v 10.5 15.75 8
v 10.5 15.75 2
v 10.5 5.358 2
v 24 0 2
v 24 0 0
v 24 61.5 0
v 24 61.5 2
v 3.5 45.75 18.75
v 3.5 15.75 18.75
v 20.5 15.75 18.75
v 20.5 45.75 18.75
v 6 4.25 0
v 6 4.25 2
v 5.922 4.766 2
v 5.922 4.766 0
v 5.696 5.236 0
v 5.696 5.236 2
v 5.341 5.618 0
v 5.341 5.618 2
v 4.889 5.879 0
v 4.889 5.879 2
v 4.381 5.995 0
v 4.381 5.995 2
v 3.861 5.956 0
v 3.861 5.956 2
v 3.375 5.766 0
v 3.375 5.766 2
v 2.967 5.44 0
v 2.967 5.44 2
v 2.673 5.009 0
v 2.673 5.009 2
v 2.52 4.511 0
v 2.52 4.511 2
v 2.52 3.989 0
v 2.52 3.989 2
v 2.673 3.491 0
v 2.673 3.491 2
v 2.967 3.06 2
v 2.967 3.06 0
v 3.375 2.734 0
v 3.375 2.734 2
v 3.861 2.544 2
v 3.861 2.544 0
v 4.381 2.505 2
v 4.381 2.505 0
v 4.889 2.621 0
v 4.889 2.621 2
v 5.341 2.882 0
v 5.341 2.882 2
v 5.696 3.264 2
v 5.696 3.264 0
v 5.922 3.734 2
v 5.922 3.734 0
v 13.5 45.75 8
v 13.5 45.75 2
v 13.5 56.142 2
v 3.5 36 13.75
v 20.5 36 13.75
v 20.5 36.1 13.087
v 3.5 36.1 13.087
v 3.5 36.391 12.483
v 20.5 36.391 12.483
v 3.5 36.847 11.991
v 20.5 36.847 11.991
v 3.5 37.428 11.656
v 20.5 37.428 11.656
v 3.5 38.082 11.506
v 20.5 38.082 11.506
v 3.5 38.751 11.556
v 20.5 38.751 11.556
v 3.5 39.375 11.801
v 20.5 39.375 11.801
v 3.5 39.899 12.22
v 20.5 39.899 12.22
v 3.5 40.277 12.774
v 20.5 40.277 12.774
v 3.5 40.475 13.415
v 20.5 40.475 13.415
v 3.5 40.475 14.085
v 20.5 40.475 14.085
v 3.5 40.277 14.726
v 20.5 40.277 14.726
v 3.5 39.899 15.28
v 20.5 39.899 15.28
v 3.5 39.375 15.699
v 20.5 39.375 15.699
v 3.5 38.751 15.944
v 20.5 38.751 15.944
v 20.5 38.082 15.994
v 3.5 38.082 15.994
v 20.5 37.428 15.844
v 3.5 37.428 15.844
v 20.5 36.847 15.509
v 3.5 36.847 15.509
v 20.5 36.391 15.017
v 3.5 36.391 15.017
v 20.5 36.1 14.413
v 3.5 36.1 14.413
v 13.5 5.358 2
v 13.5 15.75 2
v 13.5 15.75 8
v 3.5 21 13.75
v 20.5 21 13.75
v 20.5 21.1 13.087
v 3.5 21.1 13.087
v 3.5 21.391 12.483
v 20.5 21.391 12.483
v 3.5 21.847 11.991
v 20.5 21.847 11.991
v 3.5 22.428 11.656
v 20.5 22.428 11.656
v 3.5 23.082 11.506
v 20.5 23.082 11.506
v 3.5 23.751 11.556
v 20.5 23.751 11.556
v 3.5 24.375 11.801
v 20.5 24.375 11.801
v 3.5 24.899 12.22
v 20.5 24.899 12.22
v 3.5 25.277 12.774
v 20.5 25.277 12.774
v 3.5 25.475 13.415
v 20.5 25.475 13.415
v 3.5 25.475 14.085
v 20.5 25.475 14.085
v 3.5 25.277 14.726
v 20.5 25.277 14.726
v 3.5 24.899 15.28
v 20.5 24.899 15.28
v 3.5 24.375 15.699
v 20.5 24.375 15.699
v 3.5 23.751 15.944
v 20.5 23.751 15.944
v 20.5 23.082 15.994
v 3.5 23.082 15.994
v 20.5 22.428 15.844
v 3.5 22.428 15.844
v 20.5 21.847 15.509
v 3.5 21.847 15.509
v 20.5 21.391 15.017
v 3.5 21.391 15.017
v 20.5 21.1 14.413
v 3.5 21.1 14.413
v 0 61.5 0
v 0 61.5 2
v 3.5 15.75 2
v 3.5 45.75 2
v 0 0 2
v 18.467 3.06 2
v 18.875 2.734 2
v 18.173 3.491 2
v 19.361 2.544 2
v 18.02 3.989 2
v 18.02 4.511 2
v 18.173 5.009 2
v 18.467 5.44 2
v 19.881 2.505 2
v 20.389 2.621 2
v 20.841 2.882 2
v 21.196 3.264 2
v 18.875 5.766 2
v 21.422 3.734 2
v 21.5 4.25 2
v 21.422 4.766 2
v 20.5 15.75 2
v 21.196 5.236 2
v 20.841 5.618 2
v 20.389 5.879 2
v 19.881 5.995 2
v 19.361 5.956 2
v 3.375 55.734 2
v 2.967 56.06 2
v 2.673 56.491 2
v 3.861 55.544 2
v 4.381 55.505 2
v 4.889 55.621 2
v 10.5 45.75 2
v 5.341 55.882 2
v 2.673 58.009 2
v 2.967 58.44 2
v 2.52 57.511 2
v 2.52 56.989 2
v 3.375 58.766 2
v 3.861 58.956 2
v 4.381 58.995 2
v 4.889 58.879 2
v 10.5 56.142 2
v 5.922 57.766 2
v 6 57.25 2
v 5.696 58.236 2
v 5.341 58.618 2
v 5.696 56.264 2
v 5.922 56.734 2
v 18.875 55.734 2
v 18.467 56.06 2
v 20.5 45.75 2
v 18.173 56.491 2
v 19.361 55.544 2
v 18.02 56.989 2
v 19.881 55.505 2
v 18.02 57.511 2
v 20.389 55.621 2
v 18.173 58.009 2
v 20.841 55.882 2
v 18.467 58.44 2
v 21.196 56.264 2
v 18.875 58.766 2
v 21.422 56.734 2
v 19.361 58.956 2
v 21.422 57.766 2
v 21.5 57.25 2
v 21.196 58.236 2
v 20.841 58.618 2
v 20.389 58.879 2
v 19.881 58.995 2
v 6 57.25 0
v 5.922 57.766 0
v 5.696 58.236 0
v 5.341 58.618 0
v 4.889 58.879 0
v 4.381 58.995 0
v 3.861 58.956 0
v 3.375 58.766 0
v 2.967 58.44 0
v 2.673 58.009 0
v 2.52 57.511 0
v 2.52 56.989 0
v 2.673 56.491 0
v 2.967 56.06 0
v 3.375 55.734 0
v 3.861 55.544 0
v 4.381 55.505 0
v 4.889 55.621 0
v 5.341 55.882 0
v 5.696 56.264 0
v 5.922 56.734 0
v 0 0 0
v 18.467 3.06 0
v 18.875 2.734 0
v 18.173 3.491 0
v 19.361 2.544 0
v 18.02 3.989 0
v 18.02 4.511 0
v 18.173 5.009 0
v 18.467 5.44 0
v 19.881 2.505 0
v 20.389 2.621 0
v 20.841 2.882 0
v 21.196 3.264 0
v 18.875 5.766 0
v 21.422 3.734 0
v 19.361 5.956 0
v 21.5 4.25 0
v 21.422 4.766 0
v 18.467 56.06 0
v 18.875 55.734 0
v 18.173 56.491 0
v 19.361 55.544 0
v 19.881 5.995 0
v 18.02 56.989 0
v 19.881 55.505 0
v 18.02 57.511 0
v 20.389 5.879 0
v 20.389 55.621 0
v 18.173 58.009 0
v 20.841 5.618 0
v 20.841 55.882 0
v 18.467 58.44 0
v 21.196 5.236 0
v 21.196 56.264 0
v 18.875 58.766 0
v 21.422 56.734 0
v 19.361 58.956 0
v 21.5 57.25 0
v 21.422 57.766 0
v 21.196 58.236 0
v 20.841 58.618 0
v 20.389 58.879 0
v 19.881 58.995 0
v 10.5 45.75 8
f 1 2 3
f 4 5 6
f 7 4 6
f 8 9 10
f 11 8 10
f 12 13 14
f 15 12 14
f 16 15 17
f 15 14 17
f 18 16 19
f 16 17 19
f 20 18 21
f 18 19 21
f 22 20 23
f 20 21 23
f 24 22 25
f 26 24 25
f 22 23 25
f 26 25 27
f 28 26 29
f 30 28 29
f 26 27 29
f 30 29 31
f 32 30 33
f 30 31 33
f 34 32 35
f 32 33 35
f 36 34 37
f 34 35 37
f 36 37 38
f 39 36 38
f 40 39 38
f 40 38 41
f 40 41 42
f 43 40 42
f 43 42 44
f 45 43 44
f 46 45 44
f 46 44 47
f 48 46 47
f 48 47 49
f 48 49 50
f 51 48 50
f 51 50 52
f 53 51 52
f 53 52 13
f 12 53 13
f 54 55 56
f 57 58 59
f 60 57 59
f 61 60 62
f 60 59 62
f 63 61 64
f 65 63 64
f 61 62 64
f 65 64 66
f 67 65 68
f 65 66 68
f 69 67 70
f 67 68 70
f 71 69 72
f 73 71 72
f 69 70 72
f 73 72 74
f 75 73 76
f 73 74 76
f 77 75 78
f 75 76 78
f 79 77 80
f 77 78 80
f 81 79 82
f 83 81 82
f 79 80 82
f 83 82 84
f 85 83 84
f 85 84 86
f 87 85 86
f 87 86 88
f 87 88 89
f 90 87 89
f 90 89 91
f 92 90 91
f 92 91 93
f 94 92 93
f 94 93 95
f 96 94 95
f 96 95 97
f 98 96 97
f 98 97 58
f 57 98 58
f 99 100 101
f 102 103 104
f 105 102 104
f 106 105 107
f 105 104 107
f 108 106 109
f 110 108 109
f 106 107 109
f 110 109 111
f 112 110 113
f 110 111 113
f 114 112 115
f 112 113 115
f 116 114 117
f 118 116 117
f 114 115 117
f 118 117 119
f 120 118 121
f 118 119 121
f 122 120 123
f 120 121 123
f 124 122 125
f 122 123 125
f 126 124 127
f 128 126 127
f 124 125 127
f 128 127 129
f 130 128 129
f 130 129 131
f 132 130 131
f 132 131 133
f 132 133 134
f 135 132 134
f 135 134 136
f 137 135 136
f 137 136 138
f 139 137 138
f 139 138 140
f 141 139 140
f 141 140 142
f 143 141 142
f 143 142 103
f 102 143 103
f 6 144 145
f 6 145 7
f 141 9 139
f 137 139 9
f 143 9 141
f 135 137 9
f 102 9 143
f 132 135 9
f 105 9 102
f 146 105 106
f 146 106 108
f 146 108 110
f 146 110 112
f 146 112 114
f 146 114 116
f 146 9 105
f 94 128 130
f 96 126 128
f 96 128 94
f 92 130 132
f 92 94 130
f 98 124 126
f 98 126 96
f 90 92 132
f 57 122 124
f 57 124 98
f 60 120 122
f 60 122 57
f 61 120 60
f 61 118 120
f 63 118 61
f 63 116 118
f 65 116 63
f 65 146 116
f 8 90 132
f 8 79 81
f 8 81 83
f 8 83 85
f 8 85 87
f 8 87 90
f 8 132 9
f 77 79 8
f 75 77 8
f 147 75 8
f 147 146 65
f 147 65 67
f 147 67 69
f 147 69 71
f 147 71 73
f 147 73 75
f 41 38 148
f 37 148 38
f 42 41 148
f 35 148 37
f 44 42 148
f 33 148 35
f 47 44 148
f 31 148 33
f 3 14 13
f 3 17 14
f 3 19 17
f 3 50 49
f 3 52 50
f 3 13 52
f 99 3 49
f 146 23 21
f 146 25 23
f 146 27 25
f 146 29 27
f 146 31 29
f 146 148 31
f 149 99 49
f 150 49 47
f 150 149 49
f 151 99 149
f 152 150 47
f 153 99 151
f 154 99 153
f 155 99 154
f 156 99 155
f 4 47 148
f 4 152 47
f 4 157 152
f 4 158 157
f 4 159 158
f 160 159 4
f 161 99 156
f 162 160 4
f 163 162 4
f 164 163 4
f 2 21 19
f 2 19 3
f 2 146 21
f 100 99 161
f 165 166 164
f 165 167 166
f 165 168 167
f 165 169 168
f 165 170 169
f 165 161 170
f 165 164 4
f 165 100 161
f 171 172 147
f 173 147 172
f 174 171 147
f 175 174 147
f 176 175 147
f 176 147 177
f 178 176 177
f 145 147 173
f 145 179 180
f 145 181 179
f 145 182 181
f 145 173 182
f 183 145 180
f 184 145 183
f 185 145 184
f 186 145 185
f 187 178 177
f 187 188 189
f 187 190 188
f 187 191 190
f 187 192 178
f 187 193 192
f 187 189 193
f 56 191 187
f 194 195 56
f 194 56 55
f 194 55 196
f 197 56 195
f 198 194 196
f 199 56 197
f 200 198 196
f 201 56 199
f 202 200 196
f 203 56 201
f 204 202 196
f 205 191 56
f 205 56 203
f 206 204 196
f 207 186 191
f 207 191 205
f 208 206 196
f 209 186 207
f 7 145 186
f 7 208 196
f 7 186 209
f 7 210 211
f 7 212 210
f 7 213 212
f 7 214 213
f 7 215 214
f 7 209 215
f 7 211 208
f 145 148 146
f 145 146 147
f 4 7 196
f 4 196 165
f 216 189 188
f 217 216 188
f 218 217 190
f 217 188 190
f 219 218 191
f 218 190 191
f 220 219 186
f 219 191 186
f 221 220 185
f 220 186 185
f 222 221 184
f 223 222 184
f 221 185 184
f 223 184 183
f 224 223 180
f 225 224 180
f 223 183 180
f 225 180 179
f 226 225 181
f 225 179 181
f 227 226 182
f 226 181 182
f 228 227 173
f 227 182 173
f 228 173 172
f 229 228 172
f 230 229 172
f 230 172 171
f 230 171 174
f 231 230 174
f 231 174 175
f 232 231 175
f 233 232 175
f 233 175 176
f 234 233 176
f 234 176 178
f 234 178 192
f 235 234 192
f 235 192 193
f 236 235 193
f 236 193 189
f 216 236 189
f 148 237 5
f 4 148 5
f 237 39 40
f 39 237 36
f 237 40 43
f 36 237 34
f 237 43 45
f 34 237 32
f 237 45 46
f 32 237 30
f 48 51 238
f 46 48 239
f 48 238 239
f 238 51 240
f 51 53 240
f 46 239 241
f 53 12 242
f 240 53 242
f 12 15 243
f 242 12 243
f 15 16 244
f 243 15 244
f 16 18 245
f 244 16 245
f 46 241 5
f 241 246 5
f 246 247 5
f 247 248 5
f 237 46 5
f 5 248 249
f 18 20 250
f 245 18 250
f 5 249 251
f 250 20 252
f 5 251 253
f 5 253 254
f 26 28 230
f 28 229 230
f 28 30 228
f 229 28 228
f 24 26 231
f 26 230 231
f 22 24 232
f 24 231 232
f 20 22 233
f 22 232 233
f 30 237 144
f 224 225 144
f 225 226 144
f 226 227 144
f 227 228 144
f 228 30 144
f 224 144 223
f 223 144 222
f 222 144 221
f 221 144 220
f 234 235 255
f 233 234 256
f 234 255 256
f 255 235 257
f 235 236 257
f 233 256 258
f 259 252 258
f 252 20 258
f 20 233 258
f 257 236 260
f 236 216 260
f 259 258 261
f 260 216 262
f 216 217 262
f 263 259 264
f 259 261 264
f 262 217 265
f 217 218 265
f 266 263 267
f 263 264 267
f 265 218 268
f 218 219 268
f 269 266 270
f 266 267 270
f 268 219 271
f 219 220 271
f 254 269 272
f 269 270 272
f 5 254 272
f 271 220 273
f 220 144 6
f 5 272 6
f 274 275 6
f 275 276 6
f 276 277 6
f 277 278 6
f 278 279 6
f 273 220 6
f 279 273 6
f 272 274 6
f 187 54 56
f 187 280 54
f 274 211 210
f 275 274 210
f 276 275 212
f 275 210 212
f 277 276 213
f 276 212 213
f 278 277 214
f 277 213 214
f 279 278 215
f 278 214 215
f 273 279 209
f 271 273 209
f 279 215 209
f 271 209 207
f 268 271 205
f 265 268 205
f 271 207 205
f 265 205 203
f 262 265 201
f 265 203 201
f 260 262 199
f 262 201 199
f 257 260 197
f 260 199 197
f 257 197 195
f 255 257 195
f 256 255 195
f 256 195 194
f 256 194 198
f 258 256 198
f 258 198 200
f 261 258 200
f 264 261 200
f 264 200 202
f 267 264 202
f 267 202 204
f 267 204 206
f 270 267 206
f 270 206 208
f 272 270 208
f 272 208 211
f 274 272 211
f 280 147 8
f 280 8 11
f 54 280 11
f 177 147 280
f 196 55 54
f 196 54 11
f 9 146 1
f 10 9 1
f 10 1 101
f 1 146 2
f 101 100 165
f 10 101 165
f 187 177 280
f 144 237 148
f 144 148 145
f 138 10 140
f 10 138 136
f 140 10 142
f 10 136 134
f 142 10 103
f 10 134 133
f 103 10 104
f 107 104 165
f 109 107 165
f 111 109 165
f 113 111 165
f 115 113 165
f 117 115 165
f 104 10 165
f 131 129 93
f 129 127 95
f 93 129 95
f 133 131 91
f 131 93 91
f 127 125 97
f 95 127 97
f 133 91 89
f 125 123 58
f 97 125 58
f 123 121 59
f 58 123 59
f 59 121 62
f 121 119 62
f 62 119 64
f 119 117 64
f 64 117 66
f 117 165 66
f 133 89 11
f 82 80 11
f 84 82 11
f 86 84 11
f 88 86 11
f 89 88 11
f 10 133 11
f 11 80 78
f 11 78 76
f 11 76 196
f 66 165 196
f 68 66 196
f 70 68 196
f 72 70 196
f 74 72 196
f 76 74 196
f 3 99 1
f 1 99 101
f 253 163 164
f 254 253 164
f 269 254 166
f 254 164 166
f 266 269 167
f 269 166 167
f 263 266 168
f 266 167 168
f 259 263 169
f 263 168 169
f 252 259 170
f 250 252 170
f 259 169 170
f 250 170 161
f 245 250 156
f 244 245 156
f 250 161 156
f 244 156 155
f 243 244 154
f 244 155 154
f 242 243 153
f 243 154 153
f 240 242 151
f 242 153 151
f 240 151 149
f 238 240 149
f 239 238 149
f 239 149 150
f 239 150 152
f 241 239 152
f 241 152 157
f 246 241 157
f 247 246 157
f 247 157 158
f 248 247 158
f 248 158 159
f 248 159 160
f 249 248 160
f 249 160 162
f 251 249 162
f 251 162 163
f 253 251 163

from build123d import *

# Parameters (mm, degrees)
SKETCH_2_W          = 24
SKETCH_2_H          = 61.5
SKETCH_2_R          = 1.75
EXTRUDE_1_DEPTH     = 2
SKETCH_3_W          = 17
SKETCH_3_H          = 30
EXTRUDE_2_DEPTH     = 16.75
SKETCH_4_R          = 2.25
CUT_EXTRUDE_1_DEPTH = 69.628073702
EXTRUDE_3_DEPTH     = 1.5
EXTRUDE_START       = -2
SKETCH_6_R          = 1.75
EXTRUDE_4_DEPTH     = 2
SKETCH_7_R          = 1.75
CUT_EXTRUDE_2_DEPTH = 69.108828356


with BuildPart() as part:
    # 草图2 → 凸台-拉伸1 (new body)
    with BuildSketch(Plane.XY):
        with Locations((12, 30.75)):
            Rectangle(SKETCH_2_W, SKETCH_2_H)
        with Locations((5, 56.5)):
            Circle(SKETCH_2_R, mode=Mode.SUBTRACT)
        with Locations((19, 56.5)):
            Circle(SKETCH_2_R, mode=Mode.SUBTRACT)
        with Locations((5, 5)):
            Circle(SKETCH_2_R, mode=Mode.SUBTRACT)
        with Locations((19, 5)):
            Circle(SKETCH_2_R, mode=Mode.SUBTRACT)
    extrude(amount=EXTRUDE_1_DEPTH)

    # 草图3 → 凸台-拉伸2 (add)
    with BuildSketch(Plane.XY.offset(2)):
        with Locations((12, 30.75)):
            Rectangle(SKETCH_3_W, SKETCH_3_H)
    extrude(amount=EXTRUDE_2_DEPTH)

    # 草图4 → 切除-拉伸1 (cut, through all)
    with BuildSketch(Plane(origin=(24, 0, 0), x_dir=(0, 0, -1), z_dir=(1, 0, 0))):
        with Locations(Location((-13.75, 23.25, 0), (0, 0, 270))):
            Circle(SKETCH_4_R)
        with Locations(Location((-13.75, 38.25, 0), (0, 0, 270))):
            Circle(SKETCH_4_R)
    extrude(amount=-CUT_EXTRUDE_1_DEPTH, mode=Mode.SUBTRACT)

    # 草图5 → 凸台-拉伸3 (add, symmetric)
    with BuildSketch(Plane(origin=(12, 0, 0), x_dir=(0, 0, -1), z_dir=(1, 0, 0))):
        Polygon((-2, 56.142304845), (-2, 45.75), (-8, 45.75), align=None)
        Polygon((-2, 15.75), (-2, 5.357695155), (-8, 15.75), align=None)
    extrude(amount=EXTRUDE_3_DEPTH, both=True)

    # 草图6 → 凸台-拉伸4 (add)
    with BuildSketch(Plane.XY.offset(2).offset(EXTRUDE_START)):
        with Locations((5, 56.5)):
            Circle(SKETCH_6_R)
        with Locations((19, 56.5)):
            Circle(SKETCH_6_R)
        with Locations((19, 5)):
            Circle(SKETCH_6_R)
        with Locations((5, 5)):
            Circle(SKETCH_6_R)
    extrude(amount=EXTRUDE_4_DEPTH)

    # 草图7 → 切除-拉伸2 (cut, through all)
    with BuildSketch(Plane.XY.offset(2)):
        with Locations((4.25, 57.25)):
            Circle(SKETCH_7_R)
        with Locations((19.75, 57.25)):
            Circle(SKETCH_7_R)
        with Locations((4.25, 4.25)):
            Circle(SKETCH_7_R)
        with Locations((19.75, 4.25)):
            Circle(SKETCH_7_R)
    extrude(amount=-CUT_EXTRUDE_2_DEPTH, mode=Mode.SUBTRACT)


solid = part.part
